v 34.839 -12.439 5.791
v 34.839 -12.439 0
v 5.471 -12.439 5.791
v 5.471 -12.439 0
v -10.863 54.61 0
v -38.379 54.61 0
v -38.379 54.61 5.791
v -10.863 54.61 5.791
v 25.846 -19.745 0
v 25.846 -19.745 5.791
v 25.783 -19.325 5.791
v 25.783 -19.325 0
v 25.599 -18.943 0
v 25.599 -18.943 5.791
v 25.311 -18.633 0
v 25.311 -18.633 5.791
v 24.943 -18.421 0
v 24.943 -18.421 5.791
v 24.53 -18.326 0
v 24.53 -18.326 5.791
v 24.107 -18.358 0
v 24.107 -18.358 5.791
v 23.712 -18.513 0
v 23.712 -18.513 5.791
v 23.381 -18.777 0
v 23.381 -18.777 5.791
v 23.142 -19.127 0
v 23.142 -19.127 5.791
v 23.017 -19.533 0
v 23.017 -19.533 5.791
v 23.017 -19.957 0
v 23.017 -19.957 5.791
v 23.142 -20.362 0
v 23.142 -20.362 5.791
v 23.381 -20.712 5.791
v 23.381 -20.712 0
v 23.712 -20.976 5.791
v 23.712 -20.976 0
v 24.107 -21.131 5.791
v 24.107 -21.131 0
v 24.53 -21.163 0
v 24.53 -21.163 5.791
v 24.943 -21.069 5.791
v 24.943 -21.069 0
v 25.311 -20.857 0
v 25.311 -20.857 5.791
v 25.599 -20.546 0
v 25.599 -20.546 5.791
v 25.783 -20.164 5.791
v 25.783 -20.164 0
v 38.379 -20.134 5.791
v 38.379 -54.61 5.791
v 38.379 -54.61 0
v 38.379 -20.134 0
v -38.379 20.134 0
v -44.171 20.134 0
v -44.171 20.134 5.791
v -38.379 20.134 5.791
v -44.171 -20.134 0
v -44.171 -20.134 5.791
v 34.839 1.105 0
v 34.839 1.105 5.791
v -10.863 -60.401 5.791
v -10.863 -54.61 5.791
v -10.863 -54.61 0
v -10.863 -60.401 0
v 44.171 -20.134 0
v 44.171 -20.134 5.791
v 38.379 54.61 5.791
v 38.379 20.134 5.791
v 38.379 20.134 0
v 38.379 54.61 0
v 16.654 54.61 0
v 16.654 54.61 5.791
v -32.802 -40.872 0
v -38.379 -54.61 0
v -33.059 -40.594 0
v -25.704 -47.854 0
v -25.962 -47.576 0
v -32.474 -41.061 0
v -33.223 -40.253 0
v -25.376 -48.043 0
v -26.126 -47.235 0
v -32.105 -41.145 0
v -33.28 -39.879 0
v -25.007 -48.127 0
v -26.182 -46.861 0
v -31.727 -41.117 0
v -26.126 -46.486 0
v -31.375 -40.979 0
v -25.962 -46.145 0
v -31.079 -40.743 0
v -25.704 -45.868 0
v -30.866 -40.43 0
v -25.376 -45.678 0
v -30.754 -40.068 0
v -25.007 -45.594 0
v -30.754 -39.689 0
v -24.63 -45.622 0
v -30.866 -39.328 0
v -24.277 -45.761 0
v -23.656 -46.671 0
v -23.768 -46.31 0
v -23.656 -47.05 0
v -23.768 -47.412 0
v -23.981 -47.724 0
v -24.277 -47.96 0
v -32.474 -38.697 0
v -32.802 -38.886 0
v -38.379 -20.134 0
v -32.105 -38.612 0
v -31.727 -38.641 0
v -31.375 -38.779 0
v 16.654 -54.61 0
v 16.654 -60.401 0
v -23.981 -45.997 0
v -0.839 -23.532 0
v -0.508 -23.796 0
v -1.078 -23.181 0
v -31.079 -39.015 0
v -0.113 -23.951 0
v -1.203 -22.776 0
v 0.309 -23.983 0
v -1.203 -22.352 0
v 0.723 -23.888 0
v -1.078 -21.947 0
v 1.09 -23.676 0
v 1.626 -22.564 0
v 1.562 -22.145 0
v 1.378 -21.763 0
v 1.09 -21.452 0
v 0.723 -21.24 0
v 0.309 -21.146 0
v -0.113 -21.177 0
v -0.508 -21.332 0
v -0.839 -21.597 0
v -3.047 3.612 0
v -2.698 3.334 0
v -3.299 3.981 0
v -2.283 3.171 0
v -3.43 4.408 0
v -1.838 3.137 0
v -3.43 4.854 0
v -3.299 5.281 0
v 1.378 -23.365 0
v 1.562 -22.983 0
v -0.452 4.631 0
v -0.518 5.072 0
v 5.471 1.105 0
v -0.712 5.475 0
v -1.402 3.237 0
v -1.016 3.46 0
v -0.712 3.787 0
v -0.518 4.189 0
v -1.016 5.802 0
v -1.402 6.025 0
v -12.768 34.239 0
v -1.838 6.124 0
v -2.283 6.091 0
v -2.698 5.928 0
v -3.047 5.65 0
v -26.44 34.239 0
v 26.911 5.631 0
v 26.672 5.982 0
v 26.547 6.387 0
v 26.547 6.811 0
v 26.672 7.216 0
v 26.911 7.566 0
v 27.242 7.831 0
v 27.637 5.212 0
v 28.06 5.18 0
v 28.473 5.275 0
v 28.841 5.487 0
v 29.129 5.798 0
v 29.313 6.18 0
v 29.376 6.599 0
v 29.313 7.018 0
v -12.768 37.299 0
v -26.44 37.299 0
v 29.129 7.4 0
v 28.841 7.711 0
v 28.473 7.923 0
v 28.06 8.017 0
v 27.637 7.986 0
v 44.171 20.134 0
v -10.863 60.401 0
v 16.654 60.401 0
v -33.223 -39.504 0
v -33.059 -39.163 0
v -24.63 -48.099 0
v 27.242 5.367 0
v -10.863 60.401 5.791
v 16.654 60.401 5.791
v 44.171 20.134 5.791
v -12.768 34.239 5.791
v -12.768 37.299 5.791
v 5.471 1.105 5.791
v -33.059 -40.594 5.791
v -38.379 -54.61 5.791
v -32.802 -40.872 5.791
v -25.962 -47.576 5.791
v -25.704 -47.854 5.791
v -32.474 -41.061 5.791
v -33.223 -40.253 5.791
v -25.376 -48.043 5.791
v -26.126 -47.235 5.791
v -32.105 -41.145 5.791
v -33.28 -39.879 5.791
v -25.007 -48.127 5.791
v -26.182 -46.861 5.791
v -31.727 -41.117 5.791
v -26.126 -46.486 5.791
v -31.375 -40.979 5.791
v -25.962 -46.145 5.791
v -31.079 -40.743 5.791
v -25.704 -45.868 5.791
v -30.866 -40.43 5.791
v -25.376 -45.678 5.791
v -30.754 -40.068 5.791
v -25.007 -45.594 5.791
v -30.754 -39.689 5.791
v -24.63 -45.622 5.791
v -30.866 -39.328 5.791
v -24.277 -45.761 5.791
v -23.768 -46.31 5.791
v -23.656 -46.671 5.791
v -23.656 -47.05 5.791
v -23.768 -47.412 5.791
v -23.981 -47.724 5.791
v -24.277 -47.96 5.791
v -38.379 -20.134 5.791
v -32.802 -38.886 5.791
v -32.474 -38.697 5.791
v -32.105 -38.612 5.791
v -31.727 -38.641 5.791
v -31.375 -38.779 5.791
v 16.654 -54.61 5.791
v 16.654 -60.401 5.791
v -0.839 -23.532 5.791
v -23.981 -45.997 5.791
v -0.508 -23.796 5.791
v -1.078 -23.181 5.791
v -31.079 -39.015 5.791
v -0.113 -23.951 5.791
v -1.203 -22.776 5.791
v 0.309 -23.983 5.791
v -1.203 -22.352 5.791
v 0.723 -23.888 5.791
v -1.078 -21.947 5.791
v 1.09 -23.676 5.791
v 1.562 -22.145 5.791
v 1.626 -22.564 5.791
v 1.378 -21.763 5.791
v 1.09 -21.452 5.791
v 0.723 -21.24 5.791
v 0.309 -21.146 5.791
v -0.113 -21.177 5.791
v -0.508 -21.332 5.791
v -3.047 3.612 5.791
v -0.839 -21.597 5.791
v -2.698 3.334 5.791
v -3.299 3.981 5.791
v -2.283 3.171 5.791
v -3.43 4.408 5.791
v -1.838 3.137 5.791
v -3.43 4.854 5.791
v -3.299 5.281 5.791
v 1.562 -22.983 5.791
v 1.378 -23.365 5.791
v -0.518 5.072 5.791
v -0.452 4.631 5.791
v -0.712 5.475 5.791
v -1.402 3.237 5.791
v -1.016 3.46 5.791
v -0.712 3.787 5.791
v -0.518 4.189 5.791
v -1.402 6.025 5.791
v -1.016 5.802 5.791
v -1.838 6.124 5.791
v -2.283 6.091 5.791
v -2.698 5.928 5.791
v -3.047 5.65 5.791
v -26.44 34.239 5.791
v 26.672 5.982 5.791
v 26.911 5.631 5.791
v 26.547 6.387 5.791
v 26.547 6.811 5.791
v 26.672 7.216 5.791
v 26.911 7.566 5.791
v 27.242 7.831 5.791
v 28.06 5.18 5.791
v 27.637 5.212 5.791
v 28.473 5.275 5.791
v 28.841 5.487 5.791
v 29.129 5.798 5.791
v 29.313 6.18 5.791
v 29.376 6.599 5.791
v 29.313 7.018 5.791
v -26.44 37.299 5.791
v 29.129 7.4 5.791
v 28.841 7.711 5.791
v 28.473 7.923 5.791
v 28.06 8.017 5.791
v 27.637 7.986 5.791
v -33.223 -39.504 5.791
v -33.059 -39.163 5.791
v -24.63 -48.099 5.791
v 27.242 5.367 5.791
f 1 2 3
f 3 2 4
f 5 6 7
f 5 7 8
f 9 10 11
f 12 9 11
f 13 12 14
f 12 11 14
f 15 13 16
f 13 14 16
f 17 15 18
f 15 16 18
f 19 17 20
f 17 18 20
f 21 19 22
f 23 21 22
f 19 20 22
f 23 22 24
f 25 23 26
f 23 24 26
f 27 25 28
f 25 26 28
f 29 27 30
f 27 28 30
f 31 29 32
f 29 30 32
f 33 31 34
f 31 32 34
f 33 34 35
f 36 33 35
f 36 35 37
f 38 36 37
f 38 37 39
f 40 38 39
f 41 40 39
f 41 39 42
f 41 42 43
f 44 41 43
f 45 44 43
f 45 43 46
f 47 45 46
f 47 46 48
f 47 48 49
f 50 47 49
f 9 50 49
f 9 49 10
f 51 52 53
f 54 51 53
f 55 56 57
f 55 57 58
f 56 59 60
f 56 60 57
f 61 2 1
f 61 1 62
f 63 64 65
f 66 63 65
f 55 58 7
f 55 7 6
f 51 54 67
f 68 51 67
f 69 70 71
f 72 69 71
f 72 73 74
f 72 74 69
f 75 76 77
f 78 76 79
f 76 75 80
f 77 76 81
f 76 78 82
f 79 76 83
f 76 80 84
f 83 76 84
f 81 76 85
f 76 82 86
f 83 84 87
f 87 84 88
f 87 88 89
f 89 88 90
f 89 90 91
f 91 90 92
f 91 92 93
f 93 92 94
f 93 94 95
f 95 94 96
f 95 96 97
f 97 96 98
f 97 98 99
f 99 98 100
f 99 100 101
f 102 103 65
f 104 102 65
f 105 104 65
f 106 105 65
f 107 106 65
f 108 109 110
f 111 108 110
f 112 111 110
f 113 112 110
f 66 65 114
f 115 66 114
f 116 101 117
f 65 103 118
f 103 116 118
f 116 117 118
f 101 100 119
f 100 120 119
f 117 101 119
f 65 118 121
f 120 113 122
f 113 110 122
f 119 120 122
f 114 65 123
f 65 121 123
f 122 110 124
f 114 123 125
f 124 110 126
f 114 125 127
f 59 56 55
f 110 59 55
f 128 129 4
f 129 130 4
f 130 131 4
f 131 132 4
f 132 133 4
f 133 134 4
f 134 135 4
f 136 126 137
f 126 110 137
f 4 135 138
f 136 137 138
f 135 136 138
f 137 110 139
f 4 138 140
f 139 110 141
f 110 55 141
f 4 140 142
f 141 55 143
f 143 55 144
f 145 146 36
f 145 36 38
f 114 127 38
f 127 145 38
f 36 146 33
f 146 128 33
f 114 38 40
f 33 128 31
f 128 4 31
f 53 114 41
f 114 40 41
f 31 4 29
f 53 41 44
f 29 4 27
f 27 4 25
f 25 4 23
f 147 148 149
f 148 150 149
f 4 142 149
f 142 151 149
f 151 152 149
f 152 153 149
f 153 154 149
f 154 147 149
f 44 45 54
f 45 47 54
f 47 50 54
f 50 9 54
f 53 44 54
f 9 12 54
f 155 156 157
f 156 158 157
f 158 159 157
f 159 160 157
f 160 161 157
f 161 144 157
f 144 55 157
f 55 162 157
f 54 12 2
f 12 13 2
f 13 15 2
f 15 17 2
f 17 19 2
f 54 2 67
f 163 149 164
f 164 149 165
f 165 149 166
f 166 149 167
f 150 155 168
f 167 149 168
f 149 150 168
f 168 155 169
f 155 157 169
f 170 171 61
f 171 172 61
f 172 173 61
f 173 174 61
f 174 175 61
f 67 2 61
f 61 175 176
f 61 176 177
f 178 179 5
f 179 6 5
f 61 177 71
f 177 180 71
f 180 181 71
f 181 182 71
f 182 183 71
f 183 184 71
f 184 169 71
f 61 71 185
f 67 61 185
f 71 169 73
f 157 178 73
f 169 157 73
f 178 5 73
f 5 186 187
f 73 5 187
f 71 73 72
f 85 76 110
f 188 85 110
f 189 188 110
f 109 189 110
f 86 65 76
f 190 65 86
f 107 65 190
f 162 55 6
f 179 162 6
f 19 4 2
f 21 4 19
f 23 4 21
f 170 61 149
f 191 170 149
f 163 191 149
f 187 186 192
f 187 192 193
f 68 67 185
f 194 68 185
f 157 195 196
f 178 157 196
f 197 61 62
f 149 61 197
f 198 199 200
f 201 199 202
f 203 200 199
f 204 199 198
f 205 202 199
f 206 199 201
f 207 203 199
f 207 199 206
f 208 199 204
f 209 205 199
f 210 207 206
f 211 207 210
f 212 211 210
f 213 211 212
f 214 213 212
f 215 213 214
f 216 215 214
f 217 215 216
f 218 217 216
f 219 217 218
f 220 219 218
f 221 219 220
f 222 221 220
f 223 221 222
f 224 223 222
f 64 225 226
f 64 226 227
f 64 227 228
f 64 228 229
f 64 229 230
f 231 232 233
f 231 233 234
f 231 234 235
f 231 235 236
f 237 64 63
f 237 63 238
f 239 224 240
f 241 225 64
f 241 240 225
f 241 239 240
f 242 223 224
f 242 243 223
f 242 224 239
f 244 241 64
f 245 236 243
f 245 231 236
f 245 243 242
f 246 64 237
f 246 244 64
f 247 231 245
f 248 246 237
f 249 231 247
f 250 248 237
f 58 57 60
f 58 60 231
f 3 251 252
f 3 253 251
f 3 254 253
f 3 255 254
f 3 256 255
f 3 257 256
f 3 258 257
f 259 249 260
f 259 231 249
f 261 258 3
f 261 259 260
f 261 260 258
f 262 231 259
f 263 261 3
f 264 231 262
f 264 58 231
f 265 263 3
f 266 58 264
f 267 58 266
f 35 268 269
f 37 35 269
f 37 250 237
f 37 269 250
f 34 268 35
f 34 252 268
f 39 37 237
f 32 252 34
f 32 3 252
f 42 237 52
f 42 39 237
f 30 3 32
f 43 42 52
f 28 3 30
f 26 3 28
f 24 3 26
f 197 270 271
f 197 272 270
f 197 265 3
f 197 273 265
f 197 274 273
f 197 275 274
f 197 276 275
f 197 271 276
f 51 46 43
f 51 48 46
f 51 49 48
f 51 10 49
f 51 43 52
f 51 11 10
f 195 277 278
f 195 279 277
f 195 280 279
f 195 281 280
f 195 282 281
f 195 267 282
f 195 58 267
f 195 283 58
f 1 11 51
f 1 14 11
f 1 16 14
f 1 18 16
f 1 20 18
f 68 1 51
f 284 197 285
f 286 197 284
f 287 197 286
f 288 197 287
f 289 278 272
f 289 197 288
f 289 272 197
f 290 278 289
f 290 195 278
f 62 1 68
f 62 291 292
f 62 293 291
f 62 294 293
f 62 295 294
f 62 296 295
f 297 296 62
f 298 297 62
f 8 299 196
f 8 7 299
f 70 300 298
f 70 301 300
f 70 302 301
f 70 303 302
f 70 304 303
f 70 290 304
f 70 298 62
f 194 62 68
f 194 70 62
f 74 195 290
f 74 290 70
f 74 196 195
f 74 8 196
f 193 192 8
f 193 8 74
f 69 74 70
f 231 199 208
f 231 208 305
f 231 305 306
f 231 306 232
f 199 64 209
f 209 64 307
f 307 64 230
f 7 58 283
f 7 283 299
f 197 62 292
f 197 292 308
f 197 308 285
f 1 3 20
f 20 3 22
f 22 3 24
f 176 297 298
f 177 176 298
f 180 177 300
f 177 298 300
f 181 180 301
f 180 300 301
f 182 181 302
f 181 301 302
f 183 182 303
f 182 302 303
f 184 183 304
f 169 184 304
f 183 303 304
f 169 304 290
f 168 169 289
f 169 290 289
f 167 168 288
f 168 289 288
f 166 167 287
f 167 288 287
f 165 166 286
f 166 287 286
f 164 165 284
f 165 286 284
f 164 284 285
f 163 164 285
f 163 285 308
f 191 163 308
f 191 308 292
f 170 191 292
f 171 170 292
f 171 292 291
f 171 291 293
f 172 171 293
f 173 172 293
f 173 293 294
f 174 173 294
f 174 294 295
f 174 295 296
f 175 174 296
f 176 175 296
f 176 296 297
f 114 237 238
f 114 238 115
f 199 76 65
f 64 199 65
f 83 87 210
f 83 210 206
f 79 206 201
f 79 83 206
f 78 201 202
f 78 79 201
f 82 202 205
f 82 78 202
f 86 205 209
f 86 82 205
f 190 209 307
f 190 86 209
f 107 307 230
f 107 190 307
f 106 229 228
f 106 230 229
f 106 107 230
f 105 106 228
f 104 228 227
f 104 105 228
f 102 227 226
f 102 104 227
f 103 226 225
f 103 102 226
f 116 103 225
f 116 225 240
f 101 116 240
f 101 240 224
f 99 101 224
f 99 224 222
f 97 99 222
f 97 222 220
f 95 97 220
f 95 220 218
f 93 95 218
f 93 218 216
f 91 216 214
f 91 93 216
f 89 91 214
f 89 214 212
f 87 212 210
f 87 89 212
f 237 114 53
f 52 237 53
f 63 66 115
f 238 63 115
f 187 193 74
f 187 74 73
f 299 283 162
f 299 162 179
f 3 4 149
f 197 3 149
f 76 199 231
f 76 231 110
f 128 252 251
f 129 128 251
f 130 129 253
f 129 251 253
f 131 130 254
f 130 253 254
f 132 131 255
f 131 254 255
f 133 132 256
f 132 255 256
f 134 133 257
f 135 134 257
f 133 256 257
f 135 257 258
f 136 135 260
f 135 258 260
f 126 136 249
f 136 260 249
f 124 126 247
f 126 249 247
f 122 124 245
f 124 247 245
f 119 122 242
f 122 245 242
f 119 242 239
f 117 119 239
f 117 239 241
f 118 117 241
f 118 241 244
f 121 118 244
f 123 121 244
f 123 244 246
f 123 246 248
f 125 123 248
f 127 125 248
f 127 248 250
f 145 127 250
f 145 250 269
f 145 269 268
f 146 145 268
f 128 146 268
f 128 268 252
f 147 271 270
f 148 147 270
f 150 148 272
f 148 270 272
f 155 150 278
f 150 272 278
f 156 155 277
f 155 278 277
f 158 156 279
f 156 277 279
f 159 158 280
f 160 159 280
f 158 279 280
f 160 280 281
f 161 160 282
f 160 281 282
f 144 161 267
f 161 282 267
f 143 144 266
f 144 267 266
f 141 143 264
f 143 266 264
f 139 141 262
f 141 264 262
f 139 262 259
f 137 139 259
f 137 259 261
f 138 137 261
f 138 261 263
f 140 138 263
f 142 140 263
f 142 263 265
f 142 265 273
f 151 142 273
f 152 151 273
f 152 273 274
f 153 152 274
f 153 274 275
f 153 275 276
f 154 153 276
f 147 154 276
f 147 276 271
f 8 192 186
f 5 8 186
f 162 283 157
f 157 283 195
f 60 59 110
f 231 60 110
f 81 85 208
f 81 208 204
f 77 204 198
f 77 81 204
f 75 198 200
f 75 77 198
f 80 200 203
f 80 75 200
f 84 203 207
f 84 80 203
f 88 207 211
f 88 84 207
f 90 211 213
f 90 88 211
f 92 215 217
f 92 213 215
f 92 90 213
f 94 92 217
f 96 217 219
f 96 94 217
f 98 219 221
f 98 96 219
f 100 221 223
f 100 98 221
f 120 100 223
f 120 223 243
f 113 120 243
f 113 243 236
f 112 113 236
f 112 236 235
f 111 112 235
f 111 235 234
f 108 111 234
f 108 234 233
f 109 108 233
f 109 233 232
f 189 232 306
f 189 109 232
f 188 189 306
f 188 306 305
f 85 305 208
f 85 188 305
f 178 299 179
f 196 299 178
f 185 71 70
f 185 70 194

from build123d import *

# Parameters (mm, degrees)
SKETCH1_W                = 88.3412
SKETCH1_H                = 120.8024
BOSS_EXTRUDE1_DEPTH      = 5.7912
SKETCH6_R                = 1.4224
SKETCH6_R_2              = 1.497641053
CUT_EXTRUDE5_DEPTH       = 76.052547347
SKETCH7_W                = 29.367351422
SKETCH7_H                = 13.544863044
CUT_EXTRUDE6_DEPTH       = 76.052547347
CAVITY1_START            = -60.4012
CAVITY1_OUTLINE_W        = 5.7912
CAVITY1_OUTLINE_H        = 5.7912
CAVITY1_DEPTH            = 40.267466667
CAVITY1_START_2          = 20.133733333
CAVITY1_2_OUTLINE_W      = 5.7912
CAVITY1_2_OUTLINE_H      = 5.7912
CAVITY1_2_DEPTH          = 40.267466667
CAVITY1_3_OUTLINE_W      = 21.725466667
CAVITY1_3_OUTLINE_H      = 5.7912
CAVITY1_3_OUTLINE_W_2    = 27.516666667
CAVITY1_3_DEPTH          = 5.7912
CAVITY1_START_3          = 54.61
CAVITY1_4_OUTLINE_W      = 21.725466667
CAVITY1_4_OUTLINE_H      = 5.7912
CAVITY1_4_OUTLINE_W_2    = 27.516666667
CAVITY1_4_DEPTH          = 5.7912
CUT_EXTRUDE13_DEPTH      = 22.352
CUT_EXTRUDE13_DEPTH_BACK = 32.512
SKETCH8_R                = 1.27
SKETCH9_W                = 13.671222204
SKETCH9_H                = 3.060294153
CUT_EXTRUDE14_DEPTH      = 76.052547347


# Read off the part's stored shape, not the designer's step: Cavity1
with BuildPart() as part:
    # Sketch1 → Boss-Extrude1 (new body)
    with BuildSketch(Plane.XY):
        Rectangle(SKETCH1_W, SKETCH1_H)
    extrude(amount=BOSS_EXTRUDE1_DEPTH)

    # Sketch6 → Cut-Extrude5 (cut, through all)
    with BuildSketch(Plane.XY.offset(5.7912)):
        with Locations((0.2032, -22.564194219)):
            Circle(SKETCH6_R)
        with Locations((24.423695828, -19.744653869)):
            Circle(SKETCH6_R)
        with Locations((-1.949450117, 4.630928051)):
            Circle(SKETCH6_R_2)
        with Locations((27.953664088, 6.598815085)):
            Circle(SKETCH6_R)
    extrude(amount=-CUT_EXTRUDE5_DEPTH, mode=Mode.SUBTRACT)

    # Sketch7 → Cut-Extrude6 (cut, through all)
    with BuildSketch(Plane(origin=(0, 0, 0), x_dir=(-1, 0, 0), z_dir=(0, 0, -1))):
        with Locations((-20.155118324, -5.666932702)):
            Rectangle(SKETCH7_W, SKETCH7_H)
    extrude(amount=-CUT_EXTRUDE6_DEPTH, mode=Mode.SUBTRACT)

    # Cavity1 outline → Cavity1 (cut)
    with BuildSketch(Plane(origin=(0, 0, 0), x_dir=(1, 0, 0), z_dir=(0, 1, 0)).offset(CAVITY1_START)):
        with Locations((41.275, -2.8956)):
            Rectangle(CAVITY1_OUTLINE_W, CAVITY1_OUTLINE_H)
        with Locations((-41.275, -2.8956)):
            Rectangle(CAVITY1_OUTLINE_W, CAVITY1_OUTLINE_H)
    extrude(amount=CAVITY1_DEPTH, mode=Mode.SUBTRACT)

    # Cavity1 2 outline → Cavity1 2 (cut)
    with BuildSketch(Plane(origin=(0, 0, 0), x_dir=(1, 0, 0), z_dir=(0, 1, 0)).offset(CAVITY1_START_2)):
        with Locations((41.275, -2.8956)):
            Rectangle(CAVITY1_2_OUTLINE_W, CAVITY1_2_OUTLINE_H)
        with Locations((-41.275, -2.8956)):
            Rectangle(CAVITY1_2_OUTLINE_W, CAVITY1_2_OUTLINE_H)
    extrude(amount=CAVITY1_2_DEPTH, mode=Mode.SUBTRACT)

    # Cavity1 3 outline → Cavity1 3 (cut)
    with BuildSketch(Plane(origin=(0, 0, 0), x_dir=(1, 0, 0), z_dir=(0, 1, 0)).offset(CAVITY1_START)):
        with Locations((27.516666667, -2.8956)):
            Rectangle(CAVITY1_3_OUTLINE_W, CAVITY1_3_OUTLINE_H)
        with Locations((-24.621066667, -2.8956)):
            Rectangle(CAVITY1_3_OUTLINE_W_2, CAVITY1_3_OUTLINE_H)
    extrude(amount=CAVITY1_3_DEPTH, mode=Mode.SUBTRACT)

    # Cavity1 4 outline → Cavity1 4 (cut)
    with BuildSketch(Plane(origin=(0, 0, 0), x_dir=(1, 0, 0), z_dir=(0, 1, 0)).offset(CAVITY1_START_3)):
        with Locations((27.516666667, -2.8956)):
            Rectangle(CAVITY1_4_OUTLINE_W, CAVITY1_4_OUTLINE_H)
        with Locations((-24.621066667, -2.8956)):
            Rectangle(CAVITY1_4_OUTLINE_W_2, CAVITY1_4_OUTLINE_H)
    extrude(amount=CAVITY1_4_DEPTH, mode=Mode.SUBTRACT)

    # Sketch8 → Cut-Extrude13 (cut, two sides: drawn at the far end of the back side and taken through both)
    with BuildSketch(Plane.XY.offset(-CUT_EXTRUDE13_DEPTH_BACK)):
        with Locations(Location((-24.91218753, -46.860591388, 0), (0, 0, 180))):
            Circle(SKETCH8_R)
        with Locations(Location((-32.009882617, -39.878782893, 0), (0, 0, 180))):
            Circle(SKETCH8_R)
    extrude(amount=CUT_EXTRUDE13_DEPTH + CUT_EXTRUDE13_DEPTH_BACK, mode=Mode.SUBTRACT)

    # Sketch9 → Cut-Extrude14 (cut, through all)
    with BuildSketch(Plane.XY.offset(5.7912)):
        with Locations((-19.603898062, 35.76912754)):
            Rectangle(SKETCH9_W, SKETCH9_H)
    extrude(amount=-CUT_EXTRUDE14_DEPTH, mode=Mode.SUBTRACT)


solid = part.part
